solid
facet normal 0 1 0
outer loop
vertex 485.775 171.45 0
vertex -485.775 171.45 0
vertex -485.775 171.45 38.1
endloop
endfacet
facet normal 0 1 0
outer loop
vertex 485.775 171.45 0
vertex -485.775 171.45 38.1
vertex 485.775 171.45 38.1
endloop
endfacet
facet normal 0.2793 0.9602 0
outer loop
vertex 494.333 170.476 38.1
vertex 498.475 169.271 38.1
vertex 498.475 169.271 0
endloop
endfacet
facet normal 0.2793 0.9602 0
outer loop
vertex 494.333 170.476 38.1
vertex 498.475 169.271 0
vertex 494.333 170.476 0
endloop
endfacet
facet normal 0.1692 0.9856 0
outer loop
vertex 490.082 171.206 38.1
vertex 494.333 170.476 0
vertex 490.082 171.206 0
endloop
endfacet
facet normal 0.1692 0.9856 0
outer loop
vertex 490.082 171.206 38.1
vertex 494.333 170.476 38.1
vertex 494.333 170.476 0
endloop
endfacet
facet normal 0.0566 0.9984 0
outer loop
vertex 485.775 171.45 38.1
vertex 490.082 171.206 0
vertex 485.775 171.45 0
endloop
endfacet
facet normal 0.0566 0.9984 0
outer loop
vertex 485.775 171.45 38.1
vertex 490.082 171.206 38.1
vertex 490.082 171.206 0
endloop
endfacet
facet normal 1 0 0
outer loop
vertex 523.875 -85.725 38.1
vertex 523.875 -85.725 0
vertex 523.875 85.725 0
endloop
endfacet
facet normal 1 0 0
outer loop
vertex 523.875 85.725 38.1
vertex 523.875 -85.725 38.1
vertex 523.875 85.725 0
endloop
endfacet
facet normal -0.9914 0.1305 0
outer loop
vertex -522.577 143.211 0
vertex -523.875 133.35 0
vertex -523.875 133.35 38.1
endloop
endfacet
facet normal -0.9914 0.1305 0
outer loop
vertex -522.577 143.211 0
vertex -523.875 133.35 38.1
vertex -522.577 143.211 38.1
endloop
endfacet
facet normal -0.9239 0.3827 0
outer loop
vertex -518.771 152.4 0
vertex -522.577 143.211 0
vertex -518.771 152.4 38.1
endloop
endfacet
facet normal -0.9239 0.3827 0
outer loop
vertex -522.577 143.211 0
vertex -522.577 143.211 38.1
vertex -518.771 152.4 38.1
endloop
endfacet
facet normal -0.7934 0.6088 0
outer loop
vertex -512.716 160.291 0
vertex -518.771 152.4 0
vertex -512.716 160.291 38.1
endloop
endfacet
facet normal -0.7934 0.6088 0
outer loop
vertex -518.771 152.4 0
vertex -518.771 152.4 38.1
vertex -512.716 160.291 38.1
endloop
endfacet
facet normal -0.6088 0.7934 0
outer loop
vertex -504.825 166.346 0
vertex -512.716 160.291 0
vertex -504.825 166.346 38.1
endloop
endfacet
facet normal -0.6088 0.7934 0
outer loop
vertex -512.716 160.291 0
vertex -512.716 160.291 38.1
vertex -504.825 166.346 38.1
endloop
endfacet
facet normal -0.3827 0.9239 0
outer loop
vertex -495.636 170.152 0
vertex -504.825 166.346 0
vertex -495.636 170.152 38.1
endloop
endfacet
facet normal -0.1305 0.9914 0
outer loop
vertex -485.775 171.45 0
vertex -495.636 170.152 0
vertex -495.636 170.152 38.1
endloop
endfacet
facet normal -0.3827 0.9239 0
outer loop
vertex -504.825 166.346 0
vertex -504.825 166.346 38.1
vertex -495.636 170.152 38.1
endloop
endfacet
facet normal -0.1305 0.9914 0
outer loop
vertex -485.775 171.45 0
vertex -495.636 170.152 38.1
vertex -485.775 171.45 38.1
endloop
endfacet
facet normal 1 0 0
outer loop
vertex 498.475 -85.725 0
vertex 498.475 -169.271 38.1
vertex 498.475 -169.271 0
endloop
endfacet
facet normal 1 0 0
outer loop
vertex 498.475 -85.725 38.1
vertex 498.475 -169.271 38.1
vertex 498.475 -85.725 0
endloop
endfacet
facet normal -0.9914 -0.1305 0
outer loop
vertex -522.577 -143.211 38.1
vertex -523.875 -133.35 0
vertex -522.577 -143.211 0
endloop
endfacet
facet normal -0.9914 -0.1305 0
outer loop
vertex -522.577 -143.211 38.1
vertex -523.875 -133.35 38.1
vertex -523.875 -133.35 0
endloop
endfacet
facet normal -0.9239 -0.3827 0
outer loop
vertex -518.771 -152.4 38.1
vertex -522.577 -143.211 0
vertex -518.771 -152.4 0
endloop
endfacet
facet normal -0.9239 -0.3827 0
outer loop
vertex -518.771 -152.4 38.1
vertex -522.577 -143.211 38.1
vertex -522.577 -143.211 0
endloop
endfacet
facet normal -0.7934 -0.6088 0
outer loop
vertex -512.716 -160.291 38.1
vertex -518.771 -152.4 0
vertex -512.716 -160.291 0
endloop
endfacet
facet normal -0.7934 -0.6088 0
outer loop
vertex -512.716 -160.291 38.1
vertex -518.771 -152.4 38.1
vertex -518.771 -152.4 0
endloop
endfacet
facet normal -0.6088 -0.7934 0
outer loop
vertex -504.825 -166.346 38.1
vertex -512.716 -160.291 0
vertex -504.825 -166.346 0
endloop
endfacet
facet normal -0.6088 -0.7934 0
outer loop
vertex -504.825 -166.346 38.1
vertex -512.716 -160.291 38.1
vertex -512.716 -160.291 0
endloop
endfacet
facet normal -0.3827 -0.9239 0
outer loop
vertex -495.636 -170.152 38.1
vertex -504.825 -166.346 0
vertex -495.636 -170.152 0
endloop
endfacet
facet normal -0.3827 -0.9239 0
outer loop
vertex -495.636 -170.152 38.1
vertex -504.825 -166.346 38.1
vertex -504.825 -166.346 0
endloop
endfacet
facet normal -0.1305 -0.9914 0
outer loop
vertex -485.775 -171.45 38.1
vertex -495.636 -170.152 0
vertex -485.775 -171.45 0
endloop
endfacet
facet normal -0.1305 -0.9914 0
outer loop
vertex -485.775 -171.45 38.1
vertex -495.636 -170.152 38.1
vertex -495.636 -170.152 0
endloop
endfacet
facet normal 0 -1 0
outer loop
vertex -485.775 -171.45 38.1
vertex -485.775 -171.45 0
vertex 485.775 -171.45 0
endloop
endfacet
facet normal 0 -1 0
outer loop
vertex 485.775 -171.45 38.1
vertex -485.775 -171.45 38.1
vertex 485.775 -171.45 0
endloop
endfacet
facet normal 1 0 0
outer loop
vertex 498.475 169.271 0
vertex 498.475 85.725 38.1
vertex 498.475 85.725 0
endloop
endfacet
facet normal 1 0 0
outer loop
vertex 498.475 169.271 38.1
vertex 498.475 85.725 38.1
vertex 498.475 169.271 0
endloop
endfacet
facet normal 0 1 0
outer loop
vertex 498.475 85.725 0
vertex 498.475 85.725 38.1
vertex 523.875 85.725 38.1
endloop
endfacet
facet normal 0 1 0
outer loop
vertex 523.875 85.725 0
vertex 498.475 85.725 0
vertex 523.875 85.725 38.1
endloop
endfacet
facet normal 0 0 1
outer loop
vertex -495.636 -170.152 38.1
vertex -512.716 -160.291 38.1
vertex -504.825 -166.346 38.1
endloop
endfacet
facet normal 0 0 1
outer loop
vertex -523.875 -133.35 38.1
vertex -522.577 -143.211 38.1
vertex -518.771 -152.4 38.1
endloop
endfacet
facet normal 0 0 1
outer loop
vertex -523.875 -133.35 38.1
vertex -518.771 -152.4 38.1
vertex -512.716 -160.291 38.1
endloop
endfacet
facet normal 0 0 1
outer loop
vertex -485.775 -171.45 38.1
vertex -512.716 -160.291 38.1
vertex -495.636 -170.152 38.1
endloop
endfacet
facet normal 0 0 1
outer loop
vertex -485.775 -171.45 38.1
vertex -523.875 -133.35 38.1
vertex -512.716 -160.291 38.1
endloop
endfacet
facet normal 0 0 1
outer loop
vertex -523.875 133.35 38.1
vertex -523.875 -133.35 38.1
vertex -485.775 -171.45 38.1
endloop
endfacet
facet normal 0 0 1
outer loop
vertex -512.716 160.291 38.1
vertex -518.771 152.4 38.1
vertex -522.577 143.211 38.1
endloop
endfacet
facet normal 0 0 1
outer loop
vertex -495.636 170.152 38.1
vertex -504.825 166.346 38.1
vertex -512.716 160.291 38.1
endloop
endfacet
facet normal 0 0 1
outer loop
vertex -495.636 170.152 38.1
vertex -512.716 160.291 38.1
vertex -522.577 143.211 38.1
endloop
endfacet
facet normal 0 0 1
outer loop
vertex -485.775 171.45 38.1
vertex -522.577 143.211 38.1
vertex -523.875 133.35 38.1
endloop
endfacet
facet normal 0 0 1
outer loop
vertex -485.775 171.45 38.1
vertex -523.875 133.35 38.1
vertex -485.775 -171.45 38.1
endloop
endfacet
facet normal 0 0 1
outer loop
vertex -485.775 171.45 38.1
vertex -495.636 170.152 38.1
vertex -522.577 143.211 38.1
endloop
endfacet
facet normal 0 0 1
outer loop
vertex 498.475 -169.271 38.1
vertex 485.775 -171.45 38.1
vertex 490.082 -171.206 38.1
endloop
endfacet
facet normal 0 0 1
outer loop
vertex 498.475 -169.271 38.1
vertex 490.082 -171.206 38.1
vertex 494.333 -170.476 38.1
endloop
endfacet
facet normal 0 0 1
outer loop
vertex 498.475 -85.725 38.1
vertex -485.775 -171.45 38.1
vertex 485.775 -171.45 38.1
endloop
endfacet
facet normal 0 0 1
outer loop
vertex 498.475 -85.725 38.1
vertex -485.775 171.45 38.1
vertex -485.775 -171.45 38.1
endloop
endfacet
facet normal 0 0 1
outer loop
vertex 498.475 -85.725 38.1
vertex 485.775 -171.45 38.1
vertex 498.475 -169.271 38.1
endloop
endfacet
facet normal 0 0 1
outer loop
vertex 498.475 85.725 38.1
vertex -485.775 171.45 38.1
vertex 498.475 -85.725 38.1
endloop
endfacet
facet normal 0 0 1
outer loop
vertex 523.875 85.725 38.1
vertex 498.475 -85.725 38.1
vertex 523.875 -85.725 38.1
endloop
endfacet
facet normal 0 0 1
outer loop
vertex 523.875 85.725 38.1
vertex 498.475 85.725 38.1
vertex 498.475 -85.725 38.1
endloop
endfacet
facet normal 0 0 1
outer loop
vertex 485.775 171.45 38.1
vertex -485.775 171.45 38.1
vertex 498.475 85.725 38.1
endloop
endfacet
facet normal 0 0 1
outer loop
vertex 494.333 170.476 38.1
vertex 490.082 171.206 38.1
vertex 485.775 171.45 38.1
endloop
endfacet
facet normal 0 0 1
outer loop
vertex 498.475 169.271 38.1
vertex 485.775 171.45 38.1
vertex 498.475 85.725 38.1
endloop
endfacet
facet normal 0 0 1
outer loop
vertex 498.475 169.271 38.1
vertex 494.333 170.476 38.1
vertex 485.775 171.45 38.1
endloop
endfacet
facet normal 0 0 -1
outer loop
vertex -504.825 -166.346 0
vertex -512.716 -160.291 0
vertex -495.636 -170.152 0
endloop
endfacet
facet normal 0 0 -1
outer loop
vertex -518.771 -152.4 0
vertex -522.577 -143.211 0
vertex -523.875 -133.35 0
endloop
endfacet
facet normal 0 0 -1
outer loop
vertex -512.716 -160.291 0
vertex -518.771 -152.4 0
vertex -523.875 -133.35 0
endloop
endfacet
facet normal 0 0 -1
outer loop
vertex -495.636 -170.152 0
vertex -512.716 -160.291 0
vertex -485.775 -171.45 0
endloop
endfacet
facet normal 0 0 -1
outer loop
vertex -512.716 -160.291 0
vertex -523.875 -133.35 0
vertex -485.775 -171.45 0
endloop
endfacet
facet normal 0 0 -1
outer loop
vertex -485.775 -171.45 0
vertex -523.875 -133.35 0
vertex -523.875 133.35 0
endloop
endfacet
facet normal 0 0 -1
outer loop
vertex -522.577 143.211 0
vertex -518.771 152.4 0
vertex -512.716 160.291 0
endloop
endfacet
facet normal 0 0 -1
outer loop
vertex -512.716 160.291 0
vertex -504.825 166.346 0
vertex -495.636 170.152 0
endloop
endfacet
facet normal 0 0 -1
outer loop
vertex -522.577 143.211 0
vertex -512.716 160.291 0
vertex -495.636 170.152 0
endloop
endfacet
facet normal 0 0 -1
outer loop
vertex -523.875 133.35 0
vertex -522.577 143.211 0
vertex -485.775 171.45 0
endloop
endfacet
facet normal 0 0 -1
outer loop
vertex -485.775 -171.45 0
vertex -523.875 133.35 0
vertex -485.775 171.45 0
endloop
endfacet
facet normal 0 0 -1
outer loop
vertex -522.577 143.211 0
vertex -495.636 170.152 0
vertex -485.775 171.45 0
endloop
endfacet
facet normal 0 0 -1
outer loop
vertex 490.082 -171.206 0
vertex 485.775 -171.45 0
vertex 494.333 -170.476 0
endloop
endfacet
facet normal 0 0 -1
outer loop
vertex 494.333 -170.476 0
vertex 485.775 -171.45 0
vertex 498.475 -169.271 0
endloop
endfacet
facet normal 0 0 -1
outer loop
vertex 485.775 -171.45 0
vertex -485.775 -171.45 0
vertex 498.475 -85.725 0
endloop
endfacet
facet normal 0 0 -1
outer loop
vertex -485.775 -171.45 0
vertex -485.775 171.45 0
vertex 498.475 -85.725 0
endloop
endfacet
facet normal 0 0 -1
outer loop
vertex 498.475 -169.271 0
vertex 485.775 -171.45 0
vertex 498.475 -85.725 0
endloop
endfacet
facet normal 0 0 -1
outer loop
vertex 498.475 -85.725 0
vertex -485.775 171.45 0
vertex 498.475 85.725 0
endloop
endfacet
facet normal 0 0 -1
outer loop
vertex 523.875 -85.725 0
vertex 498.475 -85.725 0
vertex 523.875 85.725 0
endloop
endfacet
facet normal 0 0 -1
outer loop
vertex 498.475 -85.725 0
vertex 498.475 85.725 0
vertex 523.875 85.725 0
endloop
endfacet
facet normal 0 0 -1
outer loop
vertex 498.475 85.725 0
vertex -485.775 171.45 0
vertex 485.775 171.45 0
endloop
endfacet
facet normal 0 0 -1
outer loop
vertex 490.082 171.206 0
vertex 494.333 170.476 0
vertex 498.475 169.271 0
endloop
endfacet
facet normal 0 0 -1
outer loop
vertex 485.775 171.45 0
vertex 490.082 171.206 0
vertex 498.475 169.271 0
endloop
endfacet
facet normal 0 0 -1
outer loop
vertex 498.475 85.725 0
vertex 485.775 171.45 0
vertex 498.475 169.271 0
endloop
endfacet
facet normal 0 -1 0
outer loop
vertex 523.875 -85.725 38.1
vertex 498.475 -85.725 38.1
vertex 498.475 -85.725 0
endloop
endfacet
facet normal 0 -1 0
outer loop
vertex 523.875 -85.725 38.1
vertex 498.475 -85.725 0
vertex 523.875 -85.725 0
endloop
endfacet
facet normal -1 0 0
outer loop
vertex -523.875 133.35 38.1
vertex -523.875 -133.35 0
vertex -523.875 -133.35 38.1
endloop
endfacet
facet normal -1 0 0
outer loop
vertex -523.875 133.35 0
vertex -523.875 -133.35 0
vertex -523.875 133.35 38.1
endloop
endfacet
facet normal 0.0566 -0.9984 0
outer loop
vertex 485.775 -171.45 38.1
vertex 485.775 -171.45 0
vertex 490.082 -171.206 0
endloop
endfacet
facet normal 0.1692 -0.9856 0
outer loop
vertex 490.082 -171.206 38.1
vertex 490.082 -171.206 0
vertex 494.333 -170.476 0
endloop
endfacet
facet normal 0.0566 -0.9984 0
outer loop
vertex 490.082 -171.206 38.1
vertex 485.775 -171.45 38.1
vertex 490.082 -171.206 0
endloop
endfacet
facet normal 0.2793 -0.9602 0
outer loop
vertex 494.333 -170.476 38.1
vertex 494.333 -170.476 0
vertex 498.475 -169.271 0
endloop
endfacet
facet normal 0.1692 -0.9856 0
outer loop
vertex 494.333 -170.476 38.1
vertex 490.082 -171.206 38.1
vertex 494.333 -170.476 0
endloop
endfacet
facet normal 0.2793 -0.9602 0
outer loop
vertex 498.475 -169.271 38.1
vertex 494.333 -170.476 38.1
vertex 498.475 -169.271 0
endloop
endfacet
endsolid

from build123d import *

# Parameters (mm, degrees)
F0_W     = 1047.75
F0_H     = 342.9
F1_DEPTH = 38.1
F2_R     = 38.1
F3_W     = 25.4
F3_H     = 85.725
F4_DEPTH = 50.8


with BuildPart() as f1:
    # F0 (on Top) → F1 (new body)
    with BuildSketch(Plane.XY):
        Rectangle(F0_W, F0_H)
    extrude(amount=F1_DEPTH)

    # F2
    f2_edges = [f1.edges().sort_by_distance(p)[0] for p in [
        (-523.875, 171.45, 19.05),
        (-523.875, -171.45, 19.05),
        (523.875, 171.45, 19.05),
        (523.875, -171.45, 19.05),
    ]]
    fillet(f2_edges, radius=F2_R)

    # F3 (on face) → F4 (cut)
    with BuildSketch(Plane.XY.offset(38.1)):
        with Locations((511.175, 128.5875)):
            Rectangle(F3_W, F3_H)
        with Locations((511.175, -128.5875)):
            Rectangle(F3_W, F3_H)
    extrude(amount=-F4_DEPTH, mode=Mode.SUBTRACT)


solid = f1.part
